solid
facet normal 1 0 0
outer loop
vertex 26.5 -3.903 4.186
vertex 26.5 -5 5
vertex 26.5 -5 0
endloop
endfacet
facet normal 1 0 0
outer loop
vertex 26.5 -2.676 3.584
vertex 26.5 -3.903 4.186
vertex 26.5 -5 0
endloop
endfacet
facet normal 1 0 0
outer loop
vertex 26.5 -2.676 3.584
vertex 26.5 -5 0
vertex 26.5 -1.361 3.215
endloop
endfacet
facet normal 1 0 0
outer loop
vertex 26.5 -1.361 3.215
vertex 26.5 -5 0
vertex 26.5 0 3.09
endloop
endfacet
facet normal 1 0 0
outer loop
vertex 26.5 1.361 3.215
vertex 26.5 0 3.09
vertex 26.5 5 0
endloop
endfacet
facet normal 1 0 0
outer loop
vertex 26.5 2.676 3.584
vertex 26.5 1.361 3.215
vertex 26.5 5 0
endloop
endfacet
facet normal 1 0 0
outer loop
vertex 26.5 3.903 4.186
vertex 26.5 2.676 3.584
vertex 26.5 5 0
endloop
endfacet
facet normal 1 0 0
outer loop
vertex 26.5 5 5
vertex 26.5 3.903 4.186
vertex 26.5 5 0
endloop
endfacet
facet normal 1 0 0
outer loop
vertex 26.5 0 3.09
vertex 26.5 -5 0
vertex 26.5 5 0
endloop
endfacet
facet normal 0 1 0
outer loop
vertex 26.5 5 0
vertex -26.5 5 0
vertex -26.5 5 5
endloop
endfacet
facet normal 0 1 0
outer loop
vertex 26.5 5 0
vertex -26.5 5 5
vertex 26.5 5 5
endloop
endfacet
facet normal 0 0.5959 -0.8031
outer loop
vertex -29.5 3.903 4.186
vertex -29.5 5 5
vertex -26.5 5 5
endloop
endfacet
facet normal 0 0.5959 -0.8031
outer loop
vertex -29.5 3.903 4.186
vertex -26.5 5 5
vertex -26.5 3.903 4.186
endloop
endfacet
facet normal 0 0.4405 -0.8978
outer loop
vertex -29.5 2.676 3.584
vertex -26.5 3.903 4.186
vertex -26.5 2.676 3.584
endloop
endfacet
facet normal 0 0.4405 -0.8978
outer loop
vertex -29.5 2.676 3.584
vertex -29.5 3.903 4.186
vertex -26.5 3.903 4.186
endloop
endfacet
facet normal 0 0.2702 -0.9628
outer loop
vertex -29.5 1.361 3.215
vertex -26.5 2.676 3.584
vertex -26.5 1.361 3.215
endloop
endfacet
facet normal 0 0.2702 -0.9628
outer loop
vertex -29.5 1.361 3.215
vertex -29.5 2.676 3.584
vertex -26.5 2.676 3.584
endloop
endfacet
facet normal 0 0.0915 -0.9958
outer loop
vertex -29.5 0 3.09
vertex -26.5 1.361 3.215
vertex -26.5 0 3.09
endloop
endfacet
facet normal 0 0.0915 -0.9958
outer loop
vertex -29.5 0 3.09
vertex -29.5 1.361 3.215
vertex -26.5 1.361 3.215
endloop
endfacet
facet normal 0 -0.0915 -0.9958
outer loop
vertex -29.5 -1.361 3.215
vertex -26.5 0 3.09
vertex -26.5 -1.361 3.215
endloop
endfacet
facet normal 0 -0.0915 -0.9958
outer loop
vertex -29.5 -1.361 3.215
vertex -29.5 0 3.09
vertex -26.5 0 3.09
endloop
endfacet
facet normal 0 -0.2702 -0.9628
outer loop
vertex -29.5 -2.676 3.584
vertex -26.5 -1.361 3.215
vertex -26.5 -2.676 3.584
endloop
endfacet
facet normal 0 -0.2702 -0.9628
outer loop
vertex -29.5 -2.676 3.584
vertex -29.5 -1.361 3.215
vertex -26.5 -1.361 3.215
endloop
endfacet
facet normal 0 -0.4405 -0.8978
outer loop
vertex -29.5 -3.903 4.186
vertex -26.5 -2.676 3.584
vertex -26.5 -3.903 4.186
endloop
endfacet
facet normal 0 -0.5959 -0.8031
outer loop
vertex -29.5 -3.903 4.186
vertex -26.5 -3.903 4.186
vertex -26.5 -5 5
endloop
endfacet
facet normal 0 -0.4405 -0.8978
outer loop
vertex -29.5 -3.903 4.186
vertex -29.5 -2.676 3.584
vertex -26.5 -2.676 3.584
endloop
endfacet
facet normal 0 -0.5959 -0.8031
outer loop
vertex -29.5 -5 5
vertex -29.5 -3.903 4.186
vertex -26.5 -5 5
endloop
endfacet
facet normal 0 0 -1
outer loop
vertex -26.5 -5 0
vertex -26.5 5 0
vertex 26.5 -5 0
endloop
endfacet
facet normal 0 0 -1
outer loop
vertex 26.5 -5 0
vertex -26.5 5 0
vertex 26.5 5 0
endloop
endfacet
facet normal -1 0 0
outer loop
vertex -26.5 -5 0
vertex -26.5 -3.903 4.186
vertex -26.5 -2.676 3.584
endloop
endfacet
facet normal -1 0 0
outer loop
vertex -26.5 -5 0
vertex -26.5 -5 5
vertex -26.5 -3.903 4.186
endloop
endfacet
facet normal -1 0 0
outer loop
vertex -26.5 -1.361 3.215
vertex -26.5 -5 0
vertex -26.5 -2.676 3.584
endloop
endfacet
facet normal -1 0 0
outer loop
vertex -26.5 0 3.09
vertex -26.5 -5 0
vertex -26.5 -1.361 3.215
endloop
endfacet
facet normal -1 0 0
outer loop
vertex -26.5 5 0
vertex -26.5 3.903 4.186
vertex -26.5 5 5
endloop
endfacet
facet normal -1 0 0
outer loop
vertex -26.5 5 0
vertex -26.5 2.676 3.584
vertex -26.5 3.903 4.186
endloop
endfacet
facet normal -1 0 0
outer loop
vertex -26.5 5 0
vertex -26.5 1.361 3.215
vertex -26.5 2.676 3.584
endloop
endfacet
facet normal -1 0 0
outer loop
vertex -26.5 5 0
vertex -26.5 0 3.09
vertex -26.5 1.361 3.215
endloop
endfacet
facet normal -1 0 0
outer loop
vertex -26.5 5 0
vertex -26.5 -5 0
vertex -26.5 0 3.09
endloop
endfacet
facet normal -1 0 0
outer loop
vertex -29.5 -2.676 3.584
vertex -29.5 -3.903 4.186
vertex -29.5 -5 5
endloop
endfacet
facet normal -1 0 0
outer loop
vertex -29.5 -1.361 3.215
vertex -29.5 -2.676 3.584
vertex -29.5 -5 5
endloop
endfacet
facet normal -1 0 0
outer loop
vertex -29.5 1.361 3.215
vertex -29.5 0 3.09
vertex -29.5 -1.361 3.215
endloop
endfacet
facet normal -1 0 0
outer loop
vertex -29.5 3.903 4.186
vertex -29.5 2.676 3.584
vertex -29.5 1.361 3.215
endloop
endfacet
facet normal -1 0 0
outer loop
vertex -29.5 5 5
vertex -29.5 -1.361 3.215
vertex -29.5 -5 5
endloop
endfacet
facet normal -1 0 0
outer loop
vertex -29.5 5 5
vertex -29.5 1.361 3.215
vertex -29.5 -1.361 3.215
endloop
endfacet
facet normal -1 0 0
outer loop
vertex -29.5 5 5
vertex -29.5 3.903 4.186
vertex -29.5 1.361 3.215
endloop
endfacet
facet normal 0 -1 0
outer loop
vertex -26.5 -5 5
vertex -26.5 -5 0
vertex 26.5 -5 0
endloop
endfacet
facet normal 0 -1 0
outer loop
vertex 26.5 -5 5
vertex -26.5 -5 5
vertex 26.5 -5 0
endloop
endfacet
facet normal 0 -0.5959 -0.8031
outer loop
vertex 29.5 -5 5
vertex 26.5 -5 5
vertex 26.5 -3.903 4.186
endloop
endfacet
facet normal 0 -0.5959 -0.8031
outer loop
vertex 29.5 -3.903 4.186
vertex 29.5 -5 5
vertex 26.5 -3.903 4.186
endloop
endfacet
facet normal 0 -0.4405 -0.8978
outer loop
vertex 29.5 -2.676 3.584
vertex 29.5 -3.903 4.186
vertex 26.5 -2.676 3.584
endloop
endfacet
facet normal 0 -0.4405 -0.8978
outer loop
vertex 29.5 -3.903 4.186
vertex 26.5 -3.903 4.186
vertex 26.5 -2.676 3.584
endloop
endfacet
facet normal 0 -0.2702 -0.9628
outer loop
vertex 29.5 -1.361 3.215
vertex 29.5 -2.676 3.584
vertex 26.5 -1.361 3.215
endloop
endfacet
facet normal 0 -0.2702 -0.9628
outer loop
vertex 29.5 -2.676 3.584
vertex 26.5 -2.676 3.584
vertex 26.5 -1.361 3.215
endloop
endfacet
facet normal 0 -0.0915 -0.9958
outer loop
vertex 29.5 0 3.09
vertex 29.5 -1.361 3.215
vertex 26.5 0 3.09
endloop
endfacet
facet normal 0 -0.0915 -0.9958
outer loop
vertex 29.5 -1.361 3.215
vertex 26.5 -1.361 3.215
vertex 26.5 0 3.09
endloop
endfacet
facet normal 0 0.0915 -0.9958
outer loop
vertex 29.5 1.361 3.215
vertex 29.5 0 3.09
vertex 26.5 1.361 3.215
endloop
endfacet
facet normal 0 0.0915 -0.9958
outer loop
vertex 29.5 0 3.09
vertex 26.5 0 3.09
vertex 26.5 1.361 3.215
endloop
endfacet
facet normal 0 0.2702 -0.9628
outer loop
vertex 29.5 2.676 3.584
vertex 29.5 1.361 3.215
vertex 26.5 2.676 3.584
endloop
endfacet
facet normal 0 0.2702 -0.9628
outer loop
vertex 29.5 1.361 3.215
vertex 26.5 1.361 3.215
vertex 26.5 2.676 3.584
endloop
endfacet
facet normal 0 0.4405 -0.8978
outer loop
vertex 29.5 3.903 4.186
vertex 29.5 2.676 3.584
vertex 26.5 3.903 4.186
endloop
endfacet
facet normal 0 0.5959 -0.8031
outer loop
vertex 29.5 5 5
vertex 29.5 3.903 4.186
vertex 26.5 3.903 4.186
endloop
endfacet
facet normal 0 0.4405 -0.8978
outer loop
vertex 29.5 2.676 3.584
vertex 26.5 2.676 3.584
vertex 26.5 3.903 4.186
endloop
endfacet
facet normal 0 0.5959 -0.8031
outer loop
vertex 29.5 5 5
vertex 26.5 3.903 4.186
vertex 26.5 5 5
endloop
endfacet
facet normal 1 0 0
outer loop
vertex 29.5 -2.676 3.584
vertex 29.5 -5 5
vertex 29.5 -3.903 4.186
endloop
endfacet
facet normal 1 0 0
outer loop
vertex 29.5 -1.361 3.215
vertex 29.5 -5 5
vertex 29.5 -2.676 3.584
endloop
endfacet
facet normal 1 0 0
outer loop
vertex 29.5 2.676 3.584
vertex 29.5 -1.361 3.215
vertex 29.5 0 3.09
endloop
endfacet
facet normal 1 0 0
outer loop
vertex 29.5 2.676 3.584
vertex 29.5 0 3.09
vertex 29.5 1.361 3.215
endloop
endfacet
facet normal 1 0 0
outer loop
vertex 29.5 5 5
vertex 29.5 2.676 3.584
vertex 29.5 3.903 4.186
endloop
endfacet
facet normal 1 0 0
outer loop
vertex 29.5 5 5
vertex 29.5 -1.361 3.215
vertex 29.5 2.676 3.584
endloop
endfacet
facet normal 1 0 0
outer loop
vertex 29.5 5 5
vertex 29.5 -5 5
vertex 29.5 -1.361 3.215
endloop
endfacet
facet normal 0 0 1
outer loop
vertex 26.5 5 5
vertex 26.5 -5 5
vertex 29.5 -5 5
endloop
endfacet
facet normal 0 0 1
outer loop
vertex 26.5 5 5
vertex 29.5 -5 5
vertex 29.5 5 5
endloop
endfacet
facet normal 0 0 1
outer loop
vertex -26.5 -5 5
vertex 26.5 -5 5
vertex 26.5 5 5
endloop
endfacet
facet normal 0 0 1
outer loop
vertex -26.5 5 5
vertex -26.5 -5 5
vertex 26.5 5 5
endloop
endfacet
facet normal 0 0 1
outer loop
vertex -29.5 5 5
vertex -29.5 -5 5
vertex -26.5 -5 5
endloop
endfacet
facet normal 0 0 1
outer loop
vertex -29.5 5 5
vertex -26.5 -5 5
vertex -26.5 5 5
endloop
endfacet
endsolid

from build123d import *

# Parameters (mm, degrees)
SKETCH_1_W      = 53
SKETCH_1_H      = 10
EXTRUDE_1_DEPTH = 5
EXTRUDE_2_DEPTH = 3
EXTRUDE_START   = 3
EXTRUDE_3_DEPTH = 3


with BuildPart() as part:
    # 草图1 → 凸台-拉伸1 (new body)
    with BuildSketch(Plane.XY):
        Rectangle(SKETCH_1_W, SKETCH_1_H)
    extrude(amount=EXTRUDE_1_DEPTH)

    # 草图2 → 凸台-拉伸2 (add)
    with BuildSketch(Plane(origin=(26.5, 0, 0), x_dir=(0, 0, -1), z_dir=(1, 0, 0))):
        with BuildLine():
            Line((-5, 5), (-5, -5))
            ThreePointArc((-5, -5), (-3.090169944, 0), (-5, 5))
        make_face()
    extrude(amount=EXTRUDE_2_DEPTH)

    # 草图3 → 凸台-拉伸3 (add)
    with BuildSketch(Plane.ZY.offset(26.5).offset(EXTRUDE_START)):
        with BuildLine():
            Line((5, -5), (5, 5))
            ThreePointArc((5, 5), (3.090169944, 0), (5, -5))
        make_face()
    extrude(amount=-EXTRUDE_3_DEPTH)


solid = part.part
